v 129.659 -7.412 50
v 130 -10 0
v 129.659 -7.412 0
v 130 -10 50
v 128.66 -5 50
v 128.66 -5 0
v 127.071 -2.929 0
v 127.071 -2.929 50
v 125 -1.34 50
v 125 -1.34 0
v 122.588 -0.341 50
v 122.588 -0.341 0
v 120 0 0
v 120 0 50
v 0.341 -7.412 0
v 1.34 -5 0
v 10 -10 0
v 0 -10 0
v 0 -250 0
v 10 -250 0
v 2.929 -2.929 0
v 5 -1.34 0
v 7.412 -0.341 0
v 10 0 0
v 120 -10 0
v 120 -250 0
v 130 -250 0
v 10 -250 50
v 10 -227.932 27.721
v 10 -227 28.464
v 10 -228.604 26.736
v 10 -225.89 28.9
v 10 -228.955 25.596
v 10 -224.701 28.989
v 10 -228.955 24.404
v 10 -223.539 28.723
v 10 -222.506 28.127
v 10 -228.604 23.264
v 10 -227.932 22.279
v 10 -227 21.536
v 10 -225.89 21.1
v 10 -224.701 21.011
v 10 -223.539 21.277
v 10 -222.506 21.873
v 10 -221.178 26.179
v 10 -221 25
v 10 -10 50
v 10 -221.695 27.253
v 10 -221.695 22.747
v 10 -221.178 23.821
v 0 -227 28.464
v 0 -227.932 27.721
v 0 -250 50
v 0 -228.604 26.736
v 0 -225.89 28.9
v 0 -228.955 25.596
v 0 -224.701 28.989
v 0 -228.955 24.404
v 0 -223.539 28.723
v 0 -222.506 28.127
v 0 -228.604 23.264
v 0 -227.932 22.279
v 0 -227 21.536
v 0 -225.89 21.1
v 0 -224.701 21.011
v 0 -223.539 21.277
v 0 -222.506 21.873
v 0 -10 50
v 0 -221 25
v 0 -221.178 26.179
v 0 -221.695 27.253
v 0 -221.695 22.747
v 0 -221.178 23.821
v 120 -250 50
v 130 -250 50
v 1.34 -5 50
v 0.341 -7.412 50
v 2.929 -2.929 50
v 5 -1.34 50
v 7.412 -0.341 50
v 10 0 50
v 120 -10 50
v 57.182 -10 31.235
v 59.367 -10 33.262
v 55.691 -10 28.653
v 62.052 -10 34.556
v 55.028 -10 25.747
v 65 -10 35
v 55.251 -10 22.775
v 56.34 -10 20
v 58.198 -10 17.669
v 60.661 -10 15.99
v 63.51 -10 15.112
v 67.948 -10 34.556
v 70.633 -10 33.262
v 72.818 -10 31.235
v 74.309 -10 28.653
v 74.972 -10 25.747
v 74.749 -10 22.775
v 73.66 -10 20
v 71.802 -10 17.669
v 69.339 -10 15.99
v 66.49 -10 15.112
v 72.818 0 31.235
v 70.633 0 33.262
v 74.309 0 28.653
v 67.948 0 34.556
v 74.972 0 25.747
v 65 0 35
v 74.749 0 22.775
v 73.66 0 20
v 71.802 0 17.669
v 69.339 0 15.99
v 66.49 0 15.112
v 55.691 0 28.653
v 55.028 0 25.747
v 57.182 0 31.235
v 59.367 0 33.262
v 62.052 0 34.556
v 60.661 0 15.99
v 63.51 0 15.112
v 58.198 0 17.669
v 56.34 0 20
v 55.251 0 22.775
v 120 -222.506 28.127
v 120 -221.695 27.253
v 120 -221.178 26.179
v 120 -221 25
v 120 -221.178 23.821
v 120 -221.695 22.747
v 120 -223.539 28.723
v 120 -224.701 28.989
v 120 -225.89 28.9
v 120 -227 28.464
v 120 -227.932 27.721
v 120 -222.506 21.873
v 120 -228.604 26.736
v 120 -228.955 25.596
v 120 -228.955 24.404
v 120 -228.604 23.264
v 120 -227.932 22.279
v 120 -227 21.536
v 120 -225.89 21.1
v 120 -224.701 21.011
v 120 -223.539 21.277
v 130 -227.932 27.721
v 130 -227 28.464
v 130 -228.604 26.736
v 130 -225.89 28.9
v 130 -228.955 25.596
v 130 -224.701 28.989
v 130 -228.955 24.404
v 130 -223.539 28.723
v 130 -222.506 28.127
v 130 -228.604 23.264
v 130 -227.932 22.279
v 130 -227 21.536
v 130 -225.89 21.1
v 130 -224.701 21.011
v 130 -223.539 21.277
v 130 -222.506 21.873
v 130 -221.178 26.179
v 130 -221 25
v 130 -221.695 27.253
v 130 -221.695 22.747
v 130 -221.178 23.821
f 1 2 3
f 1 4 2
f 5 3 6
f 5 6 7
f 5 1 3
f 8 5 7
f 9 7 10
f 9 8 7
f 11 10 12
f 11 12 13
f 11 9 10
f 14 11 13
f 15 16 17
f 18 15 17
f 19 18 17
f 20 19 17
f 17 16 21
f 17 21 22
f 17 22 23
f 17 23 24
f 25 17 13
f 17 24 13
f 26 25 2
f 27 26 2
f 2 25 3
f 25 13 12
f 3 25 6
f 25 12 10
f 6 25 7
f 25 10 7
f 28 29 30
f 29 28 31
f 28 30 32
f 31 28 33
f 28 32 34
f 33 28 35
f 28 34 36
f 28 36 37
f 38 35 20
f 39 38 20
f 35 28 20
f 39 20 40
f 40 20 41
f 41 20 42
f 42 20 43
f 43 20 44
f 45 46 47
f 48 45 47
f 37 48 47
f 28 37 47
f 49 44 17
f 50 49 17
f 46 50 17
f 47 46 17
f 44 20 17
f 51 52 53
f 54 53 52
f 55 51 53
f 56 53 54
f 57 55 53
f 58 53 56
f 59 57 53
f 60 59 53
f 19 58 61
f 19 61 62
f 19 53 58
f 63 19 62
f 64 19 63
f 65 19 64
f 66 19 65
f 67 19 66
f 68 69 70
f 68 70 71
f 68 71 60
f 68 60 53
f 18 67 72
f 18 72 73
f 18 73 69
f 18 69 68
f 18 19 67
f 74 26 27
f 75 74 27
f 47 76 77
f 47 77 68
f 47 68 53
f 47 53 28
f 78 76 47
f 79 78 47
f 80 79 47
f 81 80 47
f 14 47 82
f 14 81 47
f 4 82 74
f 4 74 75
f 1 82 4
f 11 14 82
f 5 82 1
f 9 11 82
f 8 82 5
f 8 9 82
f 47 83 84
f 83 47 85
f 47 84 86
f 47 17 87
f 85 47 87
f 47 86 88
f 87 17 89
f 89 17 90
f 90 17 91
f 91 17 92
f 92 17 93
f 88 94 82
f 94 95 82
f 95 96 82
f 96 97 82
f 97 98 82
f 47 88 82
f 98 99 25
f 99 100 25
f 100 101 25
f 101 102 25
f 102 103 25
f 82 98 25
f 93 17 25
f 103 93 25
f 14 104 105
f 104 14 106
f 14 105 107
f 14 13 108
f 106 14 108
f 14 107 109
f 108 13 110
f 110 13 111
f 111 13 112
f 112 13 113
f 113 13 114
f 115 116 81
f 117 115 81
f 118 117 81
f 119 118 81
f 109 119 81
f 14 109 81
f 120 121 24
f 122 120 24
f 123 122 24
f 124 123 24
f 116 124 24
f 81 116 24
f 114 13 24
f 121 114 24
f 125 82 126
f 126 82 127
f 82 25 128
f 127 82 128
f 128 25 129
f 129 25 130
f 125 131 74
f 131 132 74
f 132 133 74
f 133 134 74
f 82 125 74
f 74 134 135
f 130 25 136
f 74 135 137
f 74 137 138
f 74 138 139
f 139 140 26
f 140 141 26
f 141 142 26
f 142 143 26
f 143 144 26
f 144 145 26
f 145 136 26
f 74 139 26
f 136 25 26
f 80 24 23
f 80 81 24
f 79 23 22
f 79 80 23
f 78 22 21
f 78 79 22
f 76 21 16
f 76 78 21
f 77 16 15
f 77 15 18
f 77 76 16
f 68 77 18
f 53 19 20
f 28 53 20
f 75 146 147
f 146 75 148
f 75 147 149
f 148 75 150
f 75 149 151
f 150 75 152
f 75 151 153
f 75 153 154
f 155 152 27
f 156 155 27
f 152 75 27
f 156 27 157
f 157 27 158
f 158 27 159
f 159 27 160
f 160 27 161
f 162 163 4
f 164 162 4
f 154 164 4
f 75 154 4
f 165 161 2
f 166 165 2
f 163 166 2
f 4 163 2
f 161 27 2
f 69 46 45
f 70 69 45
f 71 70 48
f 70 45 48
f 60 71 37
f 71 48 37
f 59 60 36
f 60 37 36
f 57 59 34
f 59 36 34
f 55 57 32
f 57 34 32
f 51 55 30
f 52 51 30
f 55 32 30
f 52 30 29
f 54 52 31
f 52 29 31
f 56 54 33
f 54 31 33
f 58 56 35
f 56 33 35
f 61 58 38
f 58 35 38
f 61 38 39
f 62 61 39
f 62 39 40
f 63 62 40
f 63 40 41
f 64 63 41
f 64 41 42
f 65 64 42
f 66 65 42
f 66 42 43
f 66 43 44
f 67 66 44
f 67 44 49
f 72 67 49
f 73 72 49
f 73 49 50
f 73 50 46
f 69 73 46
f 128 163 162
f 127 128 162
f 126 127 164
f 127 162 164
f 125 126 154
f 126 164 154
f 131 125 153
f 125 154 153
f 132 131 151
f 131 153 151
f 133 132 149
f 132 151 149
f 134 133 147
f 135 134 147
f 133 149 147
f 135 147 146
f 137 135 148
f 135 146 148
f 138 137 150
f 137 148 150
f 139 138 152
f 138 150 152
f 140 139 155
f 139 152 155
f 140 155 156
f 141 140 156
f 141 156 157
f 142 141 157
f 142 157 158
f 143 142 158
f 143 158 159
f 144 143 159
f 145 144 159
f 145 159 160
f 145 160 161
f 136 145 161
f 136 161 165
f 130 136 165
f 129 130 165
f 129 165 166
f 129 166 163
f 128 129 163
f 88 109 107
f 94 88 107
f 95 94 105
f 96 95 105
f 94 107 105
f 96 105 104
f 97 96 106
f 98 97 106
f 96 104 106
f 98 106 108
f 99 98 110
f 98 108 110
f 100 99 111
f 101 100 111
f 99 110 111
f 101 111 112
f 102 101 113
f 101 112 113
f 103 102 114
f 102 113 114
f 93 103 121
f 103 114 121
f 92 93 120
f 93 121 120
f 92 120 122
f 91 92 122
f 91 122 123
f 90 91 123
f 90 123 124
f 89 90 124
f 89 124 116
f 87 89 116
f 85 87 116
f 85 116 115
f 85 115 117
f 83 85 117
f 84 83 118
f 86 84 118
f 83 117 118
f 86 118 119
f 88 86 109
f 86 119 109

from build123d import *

# Parameters (mm, degrees)
SKETCH1_W           = 110
SKETCH1_H           = 10
SKETCH1_W_2         = 10
SKETCH1_H_2         = 250
BOSS_EXTRUDE1_DEPTH = 50
FILLET1_R           = 10
SKETCH2_R           = 4
CUT_EXTRUDE1_DEPTH  = 149
SKETCH3_R           = 10
CUT_EXTRUDE2_DEPTH  = 10


with BuildPart() as part:
    # Sketch1 → Boss-Extrude1 (new body)
    with BuildSketch(Plane.XY):
        with Locations((65, -5)):
            Rectangle(SKETCH1_W, SKETCH1_H)
        with Locations((5, -125)):
            Rectangle(SKETCH1_W_2, SKETCH1_H_2)
        Polygon((130, 0), (120, 0), (120, -10), (120, -250), (130, -250), align=None)
    extrude(amount=BOSS_EXTRUDE1_DEPTH)

    # Fillet1
    fillet1_edges = [part.edges().sort_by_distance(p)[0] for p in [
        (0, 0, 25),
        (130, 0, 25),
    ]]
    fillet(fillet1_edges, radius=FILLET1_R)

    # Sketch2 → Cut-Extrude1 (cut)
    with BuildSketch(Plane(origin=(130, 0, 0), x_dir=(0, 0, -1), z_dir=(1, 0, 0))):
        with Locations(Location((-25, -225, 0), (0, 0, 90))):
            Circle(SKETCH2_R)
    extrude(amount=-CUT_EXTRUDE1_DEPTH, mode=Mode.SUBTRACT)

    # Sketch3 → Cut-Extrude2 (cut)
    with BuildSketch(Plane(origin=(0, 0, 0), x_dir=(1, 0, 0), z_dir=(0, 1, 0))):
        with Locations(Location((65, -25, 0), (0, 0, 270))):
            Circle(SKETCH3_R)
    extrude(amount=-CUT_EXTRUDE2_DEPTH, mode=Mode.SUBTRACT)


solid = part.part
